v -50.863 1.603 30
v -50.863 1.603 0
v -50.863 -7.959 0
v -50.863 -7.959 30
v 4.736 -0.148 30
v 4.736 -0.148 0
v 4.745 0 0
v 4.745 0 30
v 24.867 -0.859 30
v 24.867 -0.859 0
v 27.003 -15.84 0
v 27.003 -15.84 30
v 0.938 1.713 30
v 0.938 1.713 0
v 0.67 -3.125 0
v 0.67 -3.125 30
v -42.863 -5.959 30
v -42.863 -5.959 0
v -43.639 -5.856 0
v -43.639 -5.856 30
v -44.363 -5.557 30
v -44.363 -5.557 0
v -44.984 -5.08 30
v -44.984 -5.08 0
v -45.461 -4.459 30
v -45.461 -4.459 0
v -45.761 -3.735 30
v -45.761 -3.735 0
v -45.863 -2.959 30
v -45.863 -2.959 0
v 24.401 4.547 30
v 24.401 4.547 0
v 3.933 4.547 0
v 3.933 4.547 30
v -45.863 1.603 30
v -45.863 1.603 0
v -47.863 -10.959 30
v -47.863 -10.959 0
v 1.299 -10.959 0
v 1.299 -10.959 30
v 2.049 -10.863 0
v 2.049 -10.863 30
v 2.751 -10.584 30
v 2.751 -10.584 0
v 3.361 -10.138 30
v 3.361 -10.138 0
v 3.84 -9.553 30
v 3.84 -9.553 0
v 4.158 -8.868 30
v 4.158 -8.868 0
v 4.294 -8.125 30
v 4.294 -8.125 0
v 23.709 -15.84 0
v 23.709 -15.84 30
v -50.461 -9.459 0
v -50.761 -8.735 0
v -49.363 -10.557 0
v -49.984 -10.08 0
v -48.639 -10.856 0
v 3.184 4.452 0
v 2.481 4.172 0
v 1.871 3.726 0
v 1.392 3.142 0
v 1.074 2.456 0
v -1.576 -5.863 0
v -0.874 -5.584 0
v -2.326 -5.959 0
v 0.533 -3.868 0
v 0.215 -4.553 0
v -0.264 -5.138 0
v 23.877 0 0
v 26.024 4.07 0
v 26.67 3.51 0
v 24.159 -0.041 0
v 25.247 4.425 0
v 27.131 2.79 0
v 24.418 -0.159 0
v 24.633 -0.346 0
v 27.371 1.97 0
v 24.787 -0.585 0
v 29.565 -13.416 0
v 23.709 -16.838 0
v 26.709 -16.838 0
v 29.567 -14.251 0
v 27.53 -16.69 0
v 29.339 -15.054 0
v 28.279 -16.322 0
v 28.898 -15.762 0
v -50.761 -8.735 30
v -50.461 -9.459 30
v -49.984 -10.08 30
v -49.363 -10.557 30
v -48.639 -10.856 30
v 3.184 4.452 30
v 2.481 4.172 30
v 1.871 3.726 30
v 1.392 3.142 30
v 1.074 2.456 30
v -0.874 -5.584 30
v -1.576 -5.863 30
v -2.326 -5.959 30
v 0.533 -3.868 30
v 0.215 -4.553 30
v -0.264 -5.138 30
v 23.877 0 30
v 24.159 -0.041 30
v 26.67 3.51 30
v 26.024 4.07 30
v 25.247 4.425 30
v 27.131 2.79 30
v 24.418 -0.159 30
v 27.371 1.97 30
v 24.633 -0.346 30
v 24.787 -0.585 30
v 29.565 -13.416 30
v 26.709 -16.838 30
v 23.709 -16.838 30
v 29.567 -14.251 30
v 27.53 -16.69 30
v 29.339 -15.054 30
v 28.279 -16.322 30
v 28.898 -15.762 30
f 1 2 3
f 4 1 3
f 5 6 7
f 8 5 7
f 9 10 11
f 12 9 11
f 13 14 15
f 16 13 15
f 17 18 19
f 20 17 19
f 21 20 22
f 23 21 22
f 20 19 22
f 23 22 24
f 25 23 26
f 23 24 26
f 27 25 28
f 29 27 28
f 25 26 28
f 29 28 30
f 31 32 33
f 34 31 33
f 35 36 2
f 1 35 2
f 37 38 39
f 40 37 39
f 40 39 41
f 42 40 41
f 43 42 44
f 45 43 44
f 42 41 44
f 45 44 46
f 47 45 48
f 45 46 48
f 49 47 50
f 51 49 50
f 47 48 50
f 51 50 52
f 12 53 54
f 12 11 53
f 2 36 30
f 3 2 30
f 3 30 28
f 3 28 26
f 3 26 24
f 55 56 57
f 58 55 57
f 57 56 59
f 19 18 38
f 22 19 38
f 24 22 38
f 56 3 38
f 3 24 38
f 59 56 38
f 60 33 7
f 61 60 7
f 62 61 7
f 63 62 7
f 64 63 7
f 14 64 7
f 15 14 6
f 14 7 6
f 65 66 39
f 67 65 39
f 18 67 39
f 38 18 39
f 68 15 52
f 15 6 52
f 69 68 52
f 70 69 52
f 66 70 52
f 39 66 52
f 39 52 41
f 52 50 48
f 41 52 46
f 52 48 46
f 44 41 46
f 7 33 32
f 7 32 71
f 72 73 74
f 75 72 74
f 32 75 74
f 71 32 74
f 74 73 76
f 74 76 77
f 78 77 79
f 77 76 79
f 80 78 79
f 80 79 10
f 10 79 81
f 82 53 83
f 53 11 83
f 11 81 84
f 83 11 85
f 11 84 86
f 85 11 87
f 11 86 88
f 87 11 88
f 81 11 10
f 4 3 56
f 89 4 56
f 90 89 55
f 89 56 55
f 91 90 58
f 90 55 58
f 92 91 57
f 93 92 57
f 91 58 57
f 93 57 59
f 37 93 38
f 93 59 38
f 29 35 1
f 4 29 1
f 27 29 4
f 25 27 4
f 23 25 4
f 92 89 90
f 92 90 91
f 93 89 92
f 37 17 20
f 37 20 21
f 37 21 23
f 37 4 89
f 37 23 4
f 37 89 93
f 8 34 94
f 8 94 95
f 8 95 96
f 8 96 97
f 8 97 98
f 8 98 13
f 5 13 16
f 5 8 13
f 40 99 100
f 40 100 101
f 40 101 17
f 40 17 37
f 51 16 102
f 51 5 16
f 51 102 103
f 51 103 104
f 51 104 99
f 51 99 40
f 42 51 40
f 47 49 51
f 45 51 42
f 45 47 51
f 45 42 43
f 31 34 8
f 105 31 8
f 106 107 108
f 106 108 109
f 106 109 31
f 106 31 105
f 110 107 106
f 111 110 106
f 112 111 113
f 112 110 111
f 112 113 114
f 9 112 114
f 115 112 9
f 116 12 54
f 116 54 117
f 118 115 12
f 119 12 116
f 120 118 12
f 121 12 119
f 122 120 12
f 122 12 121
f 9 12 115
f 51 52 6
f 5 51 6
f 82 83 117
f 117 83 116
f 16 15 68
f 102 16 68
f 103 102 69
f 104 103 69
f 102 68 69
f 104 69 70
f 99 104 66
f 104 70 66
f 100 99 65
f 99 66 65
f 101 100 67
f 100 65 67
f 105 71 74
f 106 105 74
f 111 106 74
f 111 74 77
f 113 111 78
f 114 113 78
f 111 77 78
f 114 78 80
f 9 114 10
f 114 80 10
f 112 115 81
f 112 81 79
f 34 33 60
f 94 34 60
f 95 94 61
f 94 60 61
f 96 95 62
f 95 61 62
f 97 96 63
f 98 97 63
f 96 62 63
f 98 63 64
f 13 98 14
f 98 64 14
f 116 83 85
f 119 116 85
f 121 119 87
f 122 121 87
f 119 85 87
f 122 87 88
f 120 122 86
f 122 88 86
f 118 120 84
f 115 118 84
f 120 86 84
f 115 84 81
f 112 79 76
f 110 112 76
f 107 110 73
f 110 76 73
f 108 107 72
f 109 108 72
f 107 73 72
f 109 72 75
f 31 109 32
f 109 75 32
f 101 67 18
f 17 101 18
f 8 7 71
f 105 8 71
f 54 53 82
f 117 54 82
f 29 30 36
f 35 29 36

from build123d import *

# Parameters (mm, degrees)
F1_DEPTH  = 30
F1_FACE_W = 0.99785
F1_FACE_H = 30
F2_DEPTH  = 3


with BuildPart() as f1:
    # F0 (on Top) → F1 (new body)
    with BuildSketch(Plane.XY):
        with BuildLine():
            ThreePointArc((-50.862886, -7.958589), (-49.984207, -10.07991), (-47.862886, -10.958589))
            Line((-47.862886, -10.958589), (1.29883, -10.958589))
            ThreePointArc((1.29883, -10.958589), (3.360601, -10.137833), (4.29423, -8.124658))
            Line((4.29423, -8.124658), (4.73644, -0.148474))
            Line((4.73644, -0.148474), (4.744672, 0))
            Line((4.744672, 0), (9.380593, 0))
            Line((9.380593, 0), (23.877159, 0))
            ThreePointArc((23.877159, 0), (24.532454, -0.244627), (24.867143, -0.858825))
            Line((24.867143, -0.858825), (27.003476, -15.839754))
            Line((27.003476, -15.839754), (26.708684, -15.839754))
            Line((26.708684, -15.839754), (26.708684, -16.837603))
            ThreePointArc((26.708684, -16.837603), (28.898037, -15.762383), (29.565059, -13.416228))
            Line((29.565059, -13.416228), (27.37089, 1.970275))
            ThreePointArc((27.37089, 1.970275), (26.366823, 3.812867), (24.400936, 4.546749))
            Line((24.400936, 4.546749), (3.933248, 4.546749))
            ThreePointArc((3.933248, 4.546749), (1.871477, 3.725993), (0.937848, 1.712818))
            Line((0.937848, 1.712818), (0.669652, -3.124658))
            ThreePointArc((0.669652, -3.124658), (-0.263978, -5.137833), (-2.325748, -5.958589))
            Line((-2.325748, -5.958589), (-42.862886, -5.958589))
            ThreePointArc((-42.862886, -5.958589), (-44.984207, -5.07991), (-45.862886, -2.958589))
            Line((-45.862886, -2.958589), (-45.862886, 1.602761))
            Line((-45.862886, 1.602761), (-50.862886, 1.602761))
            Line((-50.862886, 1.602761), (-50.862886, -7.958589))
        make_face()
    extrude(amount=F1_DEPTH)

    # F1_face (on face) → F2 (join)
    with BuildSketch(Plane(origin=(26.708684, -16.338679, 15), x_dir=(0, -1, 0), z_dir=(-1, 0, 0))):
        Rectangle(F1_FACE_W, F1_FACE_H)
    extrude(amount=F2_DEPTH)


solid = f1.part
